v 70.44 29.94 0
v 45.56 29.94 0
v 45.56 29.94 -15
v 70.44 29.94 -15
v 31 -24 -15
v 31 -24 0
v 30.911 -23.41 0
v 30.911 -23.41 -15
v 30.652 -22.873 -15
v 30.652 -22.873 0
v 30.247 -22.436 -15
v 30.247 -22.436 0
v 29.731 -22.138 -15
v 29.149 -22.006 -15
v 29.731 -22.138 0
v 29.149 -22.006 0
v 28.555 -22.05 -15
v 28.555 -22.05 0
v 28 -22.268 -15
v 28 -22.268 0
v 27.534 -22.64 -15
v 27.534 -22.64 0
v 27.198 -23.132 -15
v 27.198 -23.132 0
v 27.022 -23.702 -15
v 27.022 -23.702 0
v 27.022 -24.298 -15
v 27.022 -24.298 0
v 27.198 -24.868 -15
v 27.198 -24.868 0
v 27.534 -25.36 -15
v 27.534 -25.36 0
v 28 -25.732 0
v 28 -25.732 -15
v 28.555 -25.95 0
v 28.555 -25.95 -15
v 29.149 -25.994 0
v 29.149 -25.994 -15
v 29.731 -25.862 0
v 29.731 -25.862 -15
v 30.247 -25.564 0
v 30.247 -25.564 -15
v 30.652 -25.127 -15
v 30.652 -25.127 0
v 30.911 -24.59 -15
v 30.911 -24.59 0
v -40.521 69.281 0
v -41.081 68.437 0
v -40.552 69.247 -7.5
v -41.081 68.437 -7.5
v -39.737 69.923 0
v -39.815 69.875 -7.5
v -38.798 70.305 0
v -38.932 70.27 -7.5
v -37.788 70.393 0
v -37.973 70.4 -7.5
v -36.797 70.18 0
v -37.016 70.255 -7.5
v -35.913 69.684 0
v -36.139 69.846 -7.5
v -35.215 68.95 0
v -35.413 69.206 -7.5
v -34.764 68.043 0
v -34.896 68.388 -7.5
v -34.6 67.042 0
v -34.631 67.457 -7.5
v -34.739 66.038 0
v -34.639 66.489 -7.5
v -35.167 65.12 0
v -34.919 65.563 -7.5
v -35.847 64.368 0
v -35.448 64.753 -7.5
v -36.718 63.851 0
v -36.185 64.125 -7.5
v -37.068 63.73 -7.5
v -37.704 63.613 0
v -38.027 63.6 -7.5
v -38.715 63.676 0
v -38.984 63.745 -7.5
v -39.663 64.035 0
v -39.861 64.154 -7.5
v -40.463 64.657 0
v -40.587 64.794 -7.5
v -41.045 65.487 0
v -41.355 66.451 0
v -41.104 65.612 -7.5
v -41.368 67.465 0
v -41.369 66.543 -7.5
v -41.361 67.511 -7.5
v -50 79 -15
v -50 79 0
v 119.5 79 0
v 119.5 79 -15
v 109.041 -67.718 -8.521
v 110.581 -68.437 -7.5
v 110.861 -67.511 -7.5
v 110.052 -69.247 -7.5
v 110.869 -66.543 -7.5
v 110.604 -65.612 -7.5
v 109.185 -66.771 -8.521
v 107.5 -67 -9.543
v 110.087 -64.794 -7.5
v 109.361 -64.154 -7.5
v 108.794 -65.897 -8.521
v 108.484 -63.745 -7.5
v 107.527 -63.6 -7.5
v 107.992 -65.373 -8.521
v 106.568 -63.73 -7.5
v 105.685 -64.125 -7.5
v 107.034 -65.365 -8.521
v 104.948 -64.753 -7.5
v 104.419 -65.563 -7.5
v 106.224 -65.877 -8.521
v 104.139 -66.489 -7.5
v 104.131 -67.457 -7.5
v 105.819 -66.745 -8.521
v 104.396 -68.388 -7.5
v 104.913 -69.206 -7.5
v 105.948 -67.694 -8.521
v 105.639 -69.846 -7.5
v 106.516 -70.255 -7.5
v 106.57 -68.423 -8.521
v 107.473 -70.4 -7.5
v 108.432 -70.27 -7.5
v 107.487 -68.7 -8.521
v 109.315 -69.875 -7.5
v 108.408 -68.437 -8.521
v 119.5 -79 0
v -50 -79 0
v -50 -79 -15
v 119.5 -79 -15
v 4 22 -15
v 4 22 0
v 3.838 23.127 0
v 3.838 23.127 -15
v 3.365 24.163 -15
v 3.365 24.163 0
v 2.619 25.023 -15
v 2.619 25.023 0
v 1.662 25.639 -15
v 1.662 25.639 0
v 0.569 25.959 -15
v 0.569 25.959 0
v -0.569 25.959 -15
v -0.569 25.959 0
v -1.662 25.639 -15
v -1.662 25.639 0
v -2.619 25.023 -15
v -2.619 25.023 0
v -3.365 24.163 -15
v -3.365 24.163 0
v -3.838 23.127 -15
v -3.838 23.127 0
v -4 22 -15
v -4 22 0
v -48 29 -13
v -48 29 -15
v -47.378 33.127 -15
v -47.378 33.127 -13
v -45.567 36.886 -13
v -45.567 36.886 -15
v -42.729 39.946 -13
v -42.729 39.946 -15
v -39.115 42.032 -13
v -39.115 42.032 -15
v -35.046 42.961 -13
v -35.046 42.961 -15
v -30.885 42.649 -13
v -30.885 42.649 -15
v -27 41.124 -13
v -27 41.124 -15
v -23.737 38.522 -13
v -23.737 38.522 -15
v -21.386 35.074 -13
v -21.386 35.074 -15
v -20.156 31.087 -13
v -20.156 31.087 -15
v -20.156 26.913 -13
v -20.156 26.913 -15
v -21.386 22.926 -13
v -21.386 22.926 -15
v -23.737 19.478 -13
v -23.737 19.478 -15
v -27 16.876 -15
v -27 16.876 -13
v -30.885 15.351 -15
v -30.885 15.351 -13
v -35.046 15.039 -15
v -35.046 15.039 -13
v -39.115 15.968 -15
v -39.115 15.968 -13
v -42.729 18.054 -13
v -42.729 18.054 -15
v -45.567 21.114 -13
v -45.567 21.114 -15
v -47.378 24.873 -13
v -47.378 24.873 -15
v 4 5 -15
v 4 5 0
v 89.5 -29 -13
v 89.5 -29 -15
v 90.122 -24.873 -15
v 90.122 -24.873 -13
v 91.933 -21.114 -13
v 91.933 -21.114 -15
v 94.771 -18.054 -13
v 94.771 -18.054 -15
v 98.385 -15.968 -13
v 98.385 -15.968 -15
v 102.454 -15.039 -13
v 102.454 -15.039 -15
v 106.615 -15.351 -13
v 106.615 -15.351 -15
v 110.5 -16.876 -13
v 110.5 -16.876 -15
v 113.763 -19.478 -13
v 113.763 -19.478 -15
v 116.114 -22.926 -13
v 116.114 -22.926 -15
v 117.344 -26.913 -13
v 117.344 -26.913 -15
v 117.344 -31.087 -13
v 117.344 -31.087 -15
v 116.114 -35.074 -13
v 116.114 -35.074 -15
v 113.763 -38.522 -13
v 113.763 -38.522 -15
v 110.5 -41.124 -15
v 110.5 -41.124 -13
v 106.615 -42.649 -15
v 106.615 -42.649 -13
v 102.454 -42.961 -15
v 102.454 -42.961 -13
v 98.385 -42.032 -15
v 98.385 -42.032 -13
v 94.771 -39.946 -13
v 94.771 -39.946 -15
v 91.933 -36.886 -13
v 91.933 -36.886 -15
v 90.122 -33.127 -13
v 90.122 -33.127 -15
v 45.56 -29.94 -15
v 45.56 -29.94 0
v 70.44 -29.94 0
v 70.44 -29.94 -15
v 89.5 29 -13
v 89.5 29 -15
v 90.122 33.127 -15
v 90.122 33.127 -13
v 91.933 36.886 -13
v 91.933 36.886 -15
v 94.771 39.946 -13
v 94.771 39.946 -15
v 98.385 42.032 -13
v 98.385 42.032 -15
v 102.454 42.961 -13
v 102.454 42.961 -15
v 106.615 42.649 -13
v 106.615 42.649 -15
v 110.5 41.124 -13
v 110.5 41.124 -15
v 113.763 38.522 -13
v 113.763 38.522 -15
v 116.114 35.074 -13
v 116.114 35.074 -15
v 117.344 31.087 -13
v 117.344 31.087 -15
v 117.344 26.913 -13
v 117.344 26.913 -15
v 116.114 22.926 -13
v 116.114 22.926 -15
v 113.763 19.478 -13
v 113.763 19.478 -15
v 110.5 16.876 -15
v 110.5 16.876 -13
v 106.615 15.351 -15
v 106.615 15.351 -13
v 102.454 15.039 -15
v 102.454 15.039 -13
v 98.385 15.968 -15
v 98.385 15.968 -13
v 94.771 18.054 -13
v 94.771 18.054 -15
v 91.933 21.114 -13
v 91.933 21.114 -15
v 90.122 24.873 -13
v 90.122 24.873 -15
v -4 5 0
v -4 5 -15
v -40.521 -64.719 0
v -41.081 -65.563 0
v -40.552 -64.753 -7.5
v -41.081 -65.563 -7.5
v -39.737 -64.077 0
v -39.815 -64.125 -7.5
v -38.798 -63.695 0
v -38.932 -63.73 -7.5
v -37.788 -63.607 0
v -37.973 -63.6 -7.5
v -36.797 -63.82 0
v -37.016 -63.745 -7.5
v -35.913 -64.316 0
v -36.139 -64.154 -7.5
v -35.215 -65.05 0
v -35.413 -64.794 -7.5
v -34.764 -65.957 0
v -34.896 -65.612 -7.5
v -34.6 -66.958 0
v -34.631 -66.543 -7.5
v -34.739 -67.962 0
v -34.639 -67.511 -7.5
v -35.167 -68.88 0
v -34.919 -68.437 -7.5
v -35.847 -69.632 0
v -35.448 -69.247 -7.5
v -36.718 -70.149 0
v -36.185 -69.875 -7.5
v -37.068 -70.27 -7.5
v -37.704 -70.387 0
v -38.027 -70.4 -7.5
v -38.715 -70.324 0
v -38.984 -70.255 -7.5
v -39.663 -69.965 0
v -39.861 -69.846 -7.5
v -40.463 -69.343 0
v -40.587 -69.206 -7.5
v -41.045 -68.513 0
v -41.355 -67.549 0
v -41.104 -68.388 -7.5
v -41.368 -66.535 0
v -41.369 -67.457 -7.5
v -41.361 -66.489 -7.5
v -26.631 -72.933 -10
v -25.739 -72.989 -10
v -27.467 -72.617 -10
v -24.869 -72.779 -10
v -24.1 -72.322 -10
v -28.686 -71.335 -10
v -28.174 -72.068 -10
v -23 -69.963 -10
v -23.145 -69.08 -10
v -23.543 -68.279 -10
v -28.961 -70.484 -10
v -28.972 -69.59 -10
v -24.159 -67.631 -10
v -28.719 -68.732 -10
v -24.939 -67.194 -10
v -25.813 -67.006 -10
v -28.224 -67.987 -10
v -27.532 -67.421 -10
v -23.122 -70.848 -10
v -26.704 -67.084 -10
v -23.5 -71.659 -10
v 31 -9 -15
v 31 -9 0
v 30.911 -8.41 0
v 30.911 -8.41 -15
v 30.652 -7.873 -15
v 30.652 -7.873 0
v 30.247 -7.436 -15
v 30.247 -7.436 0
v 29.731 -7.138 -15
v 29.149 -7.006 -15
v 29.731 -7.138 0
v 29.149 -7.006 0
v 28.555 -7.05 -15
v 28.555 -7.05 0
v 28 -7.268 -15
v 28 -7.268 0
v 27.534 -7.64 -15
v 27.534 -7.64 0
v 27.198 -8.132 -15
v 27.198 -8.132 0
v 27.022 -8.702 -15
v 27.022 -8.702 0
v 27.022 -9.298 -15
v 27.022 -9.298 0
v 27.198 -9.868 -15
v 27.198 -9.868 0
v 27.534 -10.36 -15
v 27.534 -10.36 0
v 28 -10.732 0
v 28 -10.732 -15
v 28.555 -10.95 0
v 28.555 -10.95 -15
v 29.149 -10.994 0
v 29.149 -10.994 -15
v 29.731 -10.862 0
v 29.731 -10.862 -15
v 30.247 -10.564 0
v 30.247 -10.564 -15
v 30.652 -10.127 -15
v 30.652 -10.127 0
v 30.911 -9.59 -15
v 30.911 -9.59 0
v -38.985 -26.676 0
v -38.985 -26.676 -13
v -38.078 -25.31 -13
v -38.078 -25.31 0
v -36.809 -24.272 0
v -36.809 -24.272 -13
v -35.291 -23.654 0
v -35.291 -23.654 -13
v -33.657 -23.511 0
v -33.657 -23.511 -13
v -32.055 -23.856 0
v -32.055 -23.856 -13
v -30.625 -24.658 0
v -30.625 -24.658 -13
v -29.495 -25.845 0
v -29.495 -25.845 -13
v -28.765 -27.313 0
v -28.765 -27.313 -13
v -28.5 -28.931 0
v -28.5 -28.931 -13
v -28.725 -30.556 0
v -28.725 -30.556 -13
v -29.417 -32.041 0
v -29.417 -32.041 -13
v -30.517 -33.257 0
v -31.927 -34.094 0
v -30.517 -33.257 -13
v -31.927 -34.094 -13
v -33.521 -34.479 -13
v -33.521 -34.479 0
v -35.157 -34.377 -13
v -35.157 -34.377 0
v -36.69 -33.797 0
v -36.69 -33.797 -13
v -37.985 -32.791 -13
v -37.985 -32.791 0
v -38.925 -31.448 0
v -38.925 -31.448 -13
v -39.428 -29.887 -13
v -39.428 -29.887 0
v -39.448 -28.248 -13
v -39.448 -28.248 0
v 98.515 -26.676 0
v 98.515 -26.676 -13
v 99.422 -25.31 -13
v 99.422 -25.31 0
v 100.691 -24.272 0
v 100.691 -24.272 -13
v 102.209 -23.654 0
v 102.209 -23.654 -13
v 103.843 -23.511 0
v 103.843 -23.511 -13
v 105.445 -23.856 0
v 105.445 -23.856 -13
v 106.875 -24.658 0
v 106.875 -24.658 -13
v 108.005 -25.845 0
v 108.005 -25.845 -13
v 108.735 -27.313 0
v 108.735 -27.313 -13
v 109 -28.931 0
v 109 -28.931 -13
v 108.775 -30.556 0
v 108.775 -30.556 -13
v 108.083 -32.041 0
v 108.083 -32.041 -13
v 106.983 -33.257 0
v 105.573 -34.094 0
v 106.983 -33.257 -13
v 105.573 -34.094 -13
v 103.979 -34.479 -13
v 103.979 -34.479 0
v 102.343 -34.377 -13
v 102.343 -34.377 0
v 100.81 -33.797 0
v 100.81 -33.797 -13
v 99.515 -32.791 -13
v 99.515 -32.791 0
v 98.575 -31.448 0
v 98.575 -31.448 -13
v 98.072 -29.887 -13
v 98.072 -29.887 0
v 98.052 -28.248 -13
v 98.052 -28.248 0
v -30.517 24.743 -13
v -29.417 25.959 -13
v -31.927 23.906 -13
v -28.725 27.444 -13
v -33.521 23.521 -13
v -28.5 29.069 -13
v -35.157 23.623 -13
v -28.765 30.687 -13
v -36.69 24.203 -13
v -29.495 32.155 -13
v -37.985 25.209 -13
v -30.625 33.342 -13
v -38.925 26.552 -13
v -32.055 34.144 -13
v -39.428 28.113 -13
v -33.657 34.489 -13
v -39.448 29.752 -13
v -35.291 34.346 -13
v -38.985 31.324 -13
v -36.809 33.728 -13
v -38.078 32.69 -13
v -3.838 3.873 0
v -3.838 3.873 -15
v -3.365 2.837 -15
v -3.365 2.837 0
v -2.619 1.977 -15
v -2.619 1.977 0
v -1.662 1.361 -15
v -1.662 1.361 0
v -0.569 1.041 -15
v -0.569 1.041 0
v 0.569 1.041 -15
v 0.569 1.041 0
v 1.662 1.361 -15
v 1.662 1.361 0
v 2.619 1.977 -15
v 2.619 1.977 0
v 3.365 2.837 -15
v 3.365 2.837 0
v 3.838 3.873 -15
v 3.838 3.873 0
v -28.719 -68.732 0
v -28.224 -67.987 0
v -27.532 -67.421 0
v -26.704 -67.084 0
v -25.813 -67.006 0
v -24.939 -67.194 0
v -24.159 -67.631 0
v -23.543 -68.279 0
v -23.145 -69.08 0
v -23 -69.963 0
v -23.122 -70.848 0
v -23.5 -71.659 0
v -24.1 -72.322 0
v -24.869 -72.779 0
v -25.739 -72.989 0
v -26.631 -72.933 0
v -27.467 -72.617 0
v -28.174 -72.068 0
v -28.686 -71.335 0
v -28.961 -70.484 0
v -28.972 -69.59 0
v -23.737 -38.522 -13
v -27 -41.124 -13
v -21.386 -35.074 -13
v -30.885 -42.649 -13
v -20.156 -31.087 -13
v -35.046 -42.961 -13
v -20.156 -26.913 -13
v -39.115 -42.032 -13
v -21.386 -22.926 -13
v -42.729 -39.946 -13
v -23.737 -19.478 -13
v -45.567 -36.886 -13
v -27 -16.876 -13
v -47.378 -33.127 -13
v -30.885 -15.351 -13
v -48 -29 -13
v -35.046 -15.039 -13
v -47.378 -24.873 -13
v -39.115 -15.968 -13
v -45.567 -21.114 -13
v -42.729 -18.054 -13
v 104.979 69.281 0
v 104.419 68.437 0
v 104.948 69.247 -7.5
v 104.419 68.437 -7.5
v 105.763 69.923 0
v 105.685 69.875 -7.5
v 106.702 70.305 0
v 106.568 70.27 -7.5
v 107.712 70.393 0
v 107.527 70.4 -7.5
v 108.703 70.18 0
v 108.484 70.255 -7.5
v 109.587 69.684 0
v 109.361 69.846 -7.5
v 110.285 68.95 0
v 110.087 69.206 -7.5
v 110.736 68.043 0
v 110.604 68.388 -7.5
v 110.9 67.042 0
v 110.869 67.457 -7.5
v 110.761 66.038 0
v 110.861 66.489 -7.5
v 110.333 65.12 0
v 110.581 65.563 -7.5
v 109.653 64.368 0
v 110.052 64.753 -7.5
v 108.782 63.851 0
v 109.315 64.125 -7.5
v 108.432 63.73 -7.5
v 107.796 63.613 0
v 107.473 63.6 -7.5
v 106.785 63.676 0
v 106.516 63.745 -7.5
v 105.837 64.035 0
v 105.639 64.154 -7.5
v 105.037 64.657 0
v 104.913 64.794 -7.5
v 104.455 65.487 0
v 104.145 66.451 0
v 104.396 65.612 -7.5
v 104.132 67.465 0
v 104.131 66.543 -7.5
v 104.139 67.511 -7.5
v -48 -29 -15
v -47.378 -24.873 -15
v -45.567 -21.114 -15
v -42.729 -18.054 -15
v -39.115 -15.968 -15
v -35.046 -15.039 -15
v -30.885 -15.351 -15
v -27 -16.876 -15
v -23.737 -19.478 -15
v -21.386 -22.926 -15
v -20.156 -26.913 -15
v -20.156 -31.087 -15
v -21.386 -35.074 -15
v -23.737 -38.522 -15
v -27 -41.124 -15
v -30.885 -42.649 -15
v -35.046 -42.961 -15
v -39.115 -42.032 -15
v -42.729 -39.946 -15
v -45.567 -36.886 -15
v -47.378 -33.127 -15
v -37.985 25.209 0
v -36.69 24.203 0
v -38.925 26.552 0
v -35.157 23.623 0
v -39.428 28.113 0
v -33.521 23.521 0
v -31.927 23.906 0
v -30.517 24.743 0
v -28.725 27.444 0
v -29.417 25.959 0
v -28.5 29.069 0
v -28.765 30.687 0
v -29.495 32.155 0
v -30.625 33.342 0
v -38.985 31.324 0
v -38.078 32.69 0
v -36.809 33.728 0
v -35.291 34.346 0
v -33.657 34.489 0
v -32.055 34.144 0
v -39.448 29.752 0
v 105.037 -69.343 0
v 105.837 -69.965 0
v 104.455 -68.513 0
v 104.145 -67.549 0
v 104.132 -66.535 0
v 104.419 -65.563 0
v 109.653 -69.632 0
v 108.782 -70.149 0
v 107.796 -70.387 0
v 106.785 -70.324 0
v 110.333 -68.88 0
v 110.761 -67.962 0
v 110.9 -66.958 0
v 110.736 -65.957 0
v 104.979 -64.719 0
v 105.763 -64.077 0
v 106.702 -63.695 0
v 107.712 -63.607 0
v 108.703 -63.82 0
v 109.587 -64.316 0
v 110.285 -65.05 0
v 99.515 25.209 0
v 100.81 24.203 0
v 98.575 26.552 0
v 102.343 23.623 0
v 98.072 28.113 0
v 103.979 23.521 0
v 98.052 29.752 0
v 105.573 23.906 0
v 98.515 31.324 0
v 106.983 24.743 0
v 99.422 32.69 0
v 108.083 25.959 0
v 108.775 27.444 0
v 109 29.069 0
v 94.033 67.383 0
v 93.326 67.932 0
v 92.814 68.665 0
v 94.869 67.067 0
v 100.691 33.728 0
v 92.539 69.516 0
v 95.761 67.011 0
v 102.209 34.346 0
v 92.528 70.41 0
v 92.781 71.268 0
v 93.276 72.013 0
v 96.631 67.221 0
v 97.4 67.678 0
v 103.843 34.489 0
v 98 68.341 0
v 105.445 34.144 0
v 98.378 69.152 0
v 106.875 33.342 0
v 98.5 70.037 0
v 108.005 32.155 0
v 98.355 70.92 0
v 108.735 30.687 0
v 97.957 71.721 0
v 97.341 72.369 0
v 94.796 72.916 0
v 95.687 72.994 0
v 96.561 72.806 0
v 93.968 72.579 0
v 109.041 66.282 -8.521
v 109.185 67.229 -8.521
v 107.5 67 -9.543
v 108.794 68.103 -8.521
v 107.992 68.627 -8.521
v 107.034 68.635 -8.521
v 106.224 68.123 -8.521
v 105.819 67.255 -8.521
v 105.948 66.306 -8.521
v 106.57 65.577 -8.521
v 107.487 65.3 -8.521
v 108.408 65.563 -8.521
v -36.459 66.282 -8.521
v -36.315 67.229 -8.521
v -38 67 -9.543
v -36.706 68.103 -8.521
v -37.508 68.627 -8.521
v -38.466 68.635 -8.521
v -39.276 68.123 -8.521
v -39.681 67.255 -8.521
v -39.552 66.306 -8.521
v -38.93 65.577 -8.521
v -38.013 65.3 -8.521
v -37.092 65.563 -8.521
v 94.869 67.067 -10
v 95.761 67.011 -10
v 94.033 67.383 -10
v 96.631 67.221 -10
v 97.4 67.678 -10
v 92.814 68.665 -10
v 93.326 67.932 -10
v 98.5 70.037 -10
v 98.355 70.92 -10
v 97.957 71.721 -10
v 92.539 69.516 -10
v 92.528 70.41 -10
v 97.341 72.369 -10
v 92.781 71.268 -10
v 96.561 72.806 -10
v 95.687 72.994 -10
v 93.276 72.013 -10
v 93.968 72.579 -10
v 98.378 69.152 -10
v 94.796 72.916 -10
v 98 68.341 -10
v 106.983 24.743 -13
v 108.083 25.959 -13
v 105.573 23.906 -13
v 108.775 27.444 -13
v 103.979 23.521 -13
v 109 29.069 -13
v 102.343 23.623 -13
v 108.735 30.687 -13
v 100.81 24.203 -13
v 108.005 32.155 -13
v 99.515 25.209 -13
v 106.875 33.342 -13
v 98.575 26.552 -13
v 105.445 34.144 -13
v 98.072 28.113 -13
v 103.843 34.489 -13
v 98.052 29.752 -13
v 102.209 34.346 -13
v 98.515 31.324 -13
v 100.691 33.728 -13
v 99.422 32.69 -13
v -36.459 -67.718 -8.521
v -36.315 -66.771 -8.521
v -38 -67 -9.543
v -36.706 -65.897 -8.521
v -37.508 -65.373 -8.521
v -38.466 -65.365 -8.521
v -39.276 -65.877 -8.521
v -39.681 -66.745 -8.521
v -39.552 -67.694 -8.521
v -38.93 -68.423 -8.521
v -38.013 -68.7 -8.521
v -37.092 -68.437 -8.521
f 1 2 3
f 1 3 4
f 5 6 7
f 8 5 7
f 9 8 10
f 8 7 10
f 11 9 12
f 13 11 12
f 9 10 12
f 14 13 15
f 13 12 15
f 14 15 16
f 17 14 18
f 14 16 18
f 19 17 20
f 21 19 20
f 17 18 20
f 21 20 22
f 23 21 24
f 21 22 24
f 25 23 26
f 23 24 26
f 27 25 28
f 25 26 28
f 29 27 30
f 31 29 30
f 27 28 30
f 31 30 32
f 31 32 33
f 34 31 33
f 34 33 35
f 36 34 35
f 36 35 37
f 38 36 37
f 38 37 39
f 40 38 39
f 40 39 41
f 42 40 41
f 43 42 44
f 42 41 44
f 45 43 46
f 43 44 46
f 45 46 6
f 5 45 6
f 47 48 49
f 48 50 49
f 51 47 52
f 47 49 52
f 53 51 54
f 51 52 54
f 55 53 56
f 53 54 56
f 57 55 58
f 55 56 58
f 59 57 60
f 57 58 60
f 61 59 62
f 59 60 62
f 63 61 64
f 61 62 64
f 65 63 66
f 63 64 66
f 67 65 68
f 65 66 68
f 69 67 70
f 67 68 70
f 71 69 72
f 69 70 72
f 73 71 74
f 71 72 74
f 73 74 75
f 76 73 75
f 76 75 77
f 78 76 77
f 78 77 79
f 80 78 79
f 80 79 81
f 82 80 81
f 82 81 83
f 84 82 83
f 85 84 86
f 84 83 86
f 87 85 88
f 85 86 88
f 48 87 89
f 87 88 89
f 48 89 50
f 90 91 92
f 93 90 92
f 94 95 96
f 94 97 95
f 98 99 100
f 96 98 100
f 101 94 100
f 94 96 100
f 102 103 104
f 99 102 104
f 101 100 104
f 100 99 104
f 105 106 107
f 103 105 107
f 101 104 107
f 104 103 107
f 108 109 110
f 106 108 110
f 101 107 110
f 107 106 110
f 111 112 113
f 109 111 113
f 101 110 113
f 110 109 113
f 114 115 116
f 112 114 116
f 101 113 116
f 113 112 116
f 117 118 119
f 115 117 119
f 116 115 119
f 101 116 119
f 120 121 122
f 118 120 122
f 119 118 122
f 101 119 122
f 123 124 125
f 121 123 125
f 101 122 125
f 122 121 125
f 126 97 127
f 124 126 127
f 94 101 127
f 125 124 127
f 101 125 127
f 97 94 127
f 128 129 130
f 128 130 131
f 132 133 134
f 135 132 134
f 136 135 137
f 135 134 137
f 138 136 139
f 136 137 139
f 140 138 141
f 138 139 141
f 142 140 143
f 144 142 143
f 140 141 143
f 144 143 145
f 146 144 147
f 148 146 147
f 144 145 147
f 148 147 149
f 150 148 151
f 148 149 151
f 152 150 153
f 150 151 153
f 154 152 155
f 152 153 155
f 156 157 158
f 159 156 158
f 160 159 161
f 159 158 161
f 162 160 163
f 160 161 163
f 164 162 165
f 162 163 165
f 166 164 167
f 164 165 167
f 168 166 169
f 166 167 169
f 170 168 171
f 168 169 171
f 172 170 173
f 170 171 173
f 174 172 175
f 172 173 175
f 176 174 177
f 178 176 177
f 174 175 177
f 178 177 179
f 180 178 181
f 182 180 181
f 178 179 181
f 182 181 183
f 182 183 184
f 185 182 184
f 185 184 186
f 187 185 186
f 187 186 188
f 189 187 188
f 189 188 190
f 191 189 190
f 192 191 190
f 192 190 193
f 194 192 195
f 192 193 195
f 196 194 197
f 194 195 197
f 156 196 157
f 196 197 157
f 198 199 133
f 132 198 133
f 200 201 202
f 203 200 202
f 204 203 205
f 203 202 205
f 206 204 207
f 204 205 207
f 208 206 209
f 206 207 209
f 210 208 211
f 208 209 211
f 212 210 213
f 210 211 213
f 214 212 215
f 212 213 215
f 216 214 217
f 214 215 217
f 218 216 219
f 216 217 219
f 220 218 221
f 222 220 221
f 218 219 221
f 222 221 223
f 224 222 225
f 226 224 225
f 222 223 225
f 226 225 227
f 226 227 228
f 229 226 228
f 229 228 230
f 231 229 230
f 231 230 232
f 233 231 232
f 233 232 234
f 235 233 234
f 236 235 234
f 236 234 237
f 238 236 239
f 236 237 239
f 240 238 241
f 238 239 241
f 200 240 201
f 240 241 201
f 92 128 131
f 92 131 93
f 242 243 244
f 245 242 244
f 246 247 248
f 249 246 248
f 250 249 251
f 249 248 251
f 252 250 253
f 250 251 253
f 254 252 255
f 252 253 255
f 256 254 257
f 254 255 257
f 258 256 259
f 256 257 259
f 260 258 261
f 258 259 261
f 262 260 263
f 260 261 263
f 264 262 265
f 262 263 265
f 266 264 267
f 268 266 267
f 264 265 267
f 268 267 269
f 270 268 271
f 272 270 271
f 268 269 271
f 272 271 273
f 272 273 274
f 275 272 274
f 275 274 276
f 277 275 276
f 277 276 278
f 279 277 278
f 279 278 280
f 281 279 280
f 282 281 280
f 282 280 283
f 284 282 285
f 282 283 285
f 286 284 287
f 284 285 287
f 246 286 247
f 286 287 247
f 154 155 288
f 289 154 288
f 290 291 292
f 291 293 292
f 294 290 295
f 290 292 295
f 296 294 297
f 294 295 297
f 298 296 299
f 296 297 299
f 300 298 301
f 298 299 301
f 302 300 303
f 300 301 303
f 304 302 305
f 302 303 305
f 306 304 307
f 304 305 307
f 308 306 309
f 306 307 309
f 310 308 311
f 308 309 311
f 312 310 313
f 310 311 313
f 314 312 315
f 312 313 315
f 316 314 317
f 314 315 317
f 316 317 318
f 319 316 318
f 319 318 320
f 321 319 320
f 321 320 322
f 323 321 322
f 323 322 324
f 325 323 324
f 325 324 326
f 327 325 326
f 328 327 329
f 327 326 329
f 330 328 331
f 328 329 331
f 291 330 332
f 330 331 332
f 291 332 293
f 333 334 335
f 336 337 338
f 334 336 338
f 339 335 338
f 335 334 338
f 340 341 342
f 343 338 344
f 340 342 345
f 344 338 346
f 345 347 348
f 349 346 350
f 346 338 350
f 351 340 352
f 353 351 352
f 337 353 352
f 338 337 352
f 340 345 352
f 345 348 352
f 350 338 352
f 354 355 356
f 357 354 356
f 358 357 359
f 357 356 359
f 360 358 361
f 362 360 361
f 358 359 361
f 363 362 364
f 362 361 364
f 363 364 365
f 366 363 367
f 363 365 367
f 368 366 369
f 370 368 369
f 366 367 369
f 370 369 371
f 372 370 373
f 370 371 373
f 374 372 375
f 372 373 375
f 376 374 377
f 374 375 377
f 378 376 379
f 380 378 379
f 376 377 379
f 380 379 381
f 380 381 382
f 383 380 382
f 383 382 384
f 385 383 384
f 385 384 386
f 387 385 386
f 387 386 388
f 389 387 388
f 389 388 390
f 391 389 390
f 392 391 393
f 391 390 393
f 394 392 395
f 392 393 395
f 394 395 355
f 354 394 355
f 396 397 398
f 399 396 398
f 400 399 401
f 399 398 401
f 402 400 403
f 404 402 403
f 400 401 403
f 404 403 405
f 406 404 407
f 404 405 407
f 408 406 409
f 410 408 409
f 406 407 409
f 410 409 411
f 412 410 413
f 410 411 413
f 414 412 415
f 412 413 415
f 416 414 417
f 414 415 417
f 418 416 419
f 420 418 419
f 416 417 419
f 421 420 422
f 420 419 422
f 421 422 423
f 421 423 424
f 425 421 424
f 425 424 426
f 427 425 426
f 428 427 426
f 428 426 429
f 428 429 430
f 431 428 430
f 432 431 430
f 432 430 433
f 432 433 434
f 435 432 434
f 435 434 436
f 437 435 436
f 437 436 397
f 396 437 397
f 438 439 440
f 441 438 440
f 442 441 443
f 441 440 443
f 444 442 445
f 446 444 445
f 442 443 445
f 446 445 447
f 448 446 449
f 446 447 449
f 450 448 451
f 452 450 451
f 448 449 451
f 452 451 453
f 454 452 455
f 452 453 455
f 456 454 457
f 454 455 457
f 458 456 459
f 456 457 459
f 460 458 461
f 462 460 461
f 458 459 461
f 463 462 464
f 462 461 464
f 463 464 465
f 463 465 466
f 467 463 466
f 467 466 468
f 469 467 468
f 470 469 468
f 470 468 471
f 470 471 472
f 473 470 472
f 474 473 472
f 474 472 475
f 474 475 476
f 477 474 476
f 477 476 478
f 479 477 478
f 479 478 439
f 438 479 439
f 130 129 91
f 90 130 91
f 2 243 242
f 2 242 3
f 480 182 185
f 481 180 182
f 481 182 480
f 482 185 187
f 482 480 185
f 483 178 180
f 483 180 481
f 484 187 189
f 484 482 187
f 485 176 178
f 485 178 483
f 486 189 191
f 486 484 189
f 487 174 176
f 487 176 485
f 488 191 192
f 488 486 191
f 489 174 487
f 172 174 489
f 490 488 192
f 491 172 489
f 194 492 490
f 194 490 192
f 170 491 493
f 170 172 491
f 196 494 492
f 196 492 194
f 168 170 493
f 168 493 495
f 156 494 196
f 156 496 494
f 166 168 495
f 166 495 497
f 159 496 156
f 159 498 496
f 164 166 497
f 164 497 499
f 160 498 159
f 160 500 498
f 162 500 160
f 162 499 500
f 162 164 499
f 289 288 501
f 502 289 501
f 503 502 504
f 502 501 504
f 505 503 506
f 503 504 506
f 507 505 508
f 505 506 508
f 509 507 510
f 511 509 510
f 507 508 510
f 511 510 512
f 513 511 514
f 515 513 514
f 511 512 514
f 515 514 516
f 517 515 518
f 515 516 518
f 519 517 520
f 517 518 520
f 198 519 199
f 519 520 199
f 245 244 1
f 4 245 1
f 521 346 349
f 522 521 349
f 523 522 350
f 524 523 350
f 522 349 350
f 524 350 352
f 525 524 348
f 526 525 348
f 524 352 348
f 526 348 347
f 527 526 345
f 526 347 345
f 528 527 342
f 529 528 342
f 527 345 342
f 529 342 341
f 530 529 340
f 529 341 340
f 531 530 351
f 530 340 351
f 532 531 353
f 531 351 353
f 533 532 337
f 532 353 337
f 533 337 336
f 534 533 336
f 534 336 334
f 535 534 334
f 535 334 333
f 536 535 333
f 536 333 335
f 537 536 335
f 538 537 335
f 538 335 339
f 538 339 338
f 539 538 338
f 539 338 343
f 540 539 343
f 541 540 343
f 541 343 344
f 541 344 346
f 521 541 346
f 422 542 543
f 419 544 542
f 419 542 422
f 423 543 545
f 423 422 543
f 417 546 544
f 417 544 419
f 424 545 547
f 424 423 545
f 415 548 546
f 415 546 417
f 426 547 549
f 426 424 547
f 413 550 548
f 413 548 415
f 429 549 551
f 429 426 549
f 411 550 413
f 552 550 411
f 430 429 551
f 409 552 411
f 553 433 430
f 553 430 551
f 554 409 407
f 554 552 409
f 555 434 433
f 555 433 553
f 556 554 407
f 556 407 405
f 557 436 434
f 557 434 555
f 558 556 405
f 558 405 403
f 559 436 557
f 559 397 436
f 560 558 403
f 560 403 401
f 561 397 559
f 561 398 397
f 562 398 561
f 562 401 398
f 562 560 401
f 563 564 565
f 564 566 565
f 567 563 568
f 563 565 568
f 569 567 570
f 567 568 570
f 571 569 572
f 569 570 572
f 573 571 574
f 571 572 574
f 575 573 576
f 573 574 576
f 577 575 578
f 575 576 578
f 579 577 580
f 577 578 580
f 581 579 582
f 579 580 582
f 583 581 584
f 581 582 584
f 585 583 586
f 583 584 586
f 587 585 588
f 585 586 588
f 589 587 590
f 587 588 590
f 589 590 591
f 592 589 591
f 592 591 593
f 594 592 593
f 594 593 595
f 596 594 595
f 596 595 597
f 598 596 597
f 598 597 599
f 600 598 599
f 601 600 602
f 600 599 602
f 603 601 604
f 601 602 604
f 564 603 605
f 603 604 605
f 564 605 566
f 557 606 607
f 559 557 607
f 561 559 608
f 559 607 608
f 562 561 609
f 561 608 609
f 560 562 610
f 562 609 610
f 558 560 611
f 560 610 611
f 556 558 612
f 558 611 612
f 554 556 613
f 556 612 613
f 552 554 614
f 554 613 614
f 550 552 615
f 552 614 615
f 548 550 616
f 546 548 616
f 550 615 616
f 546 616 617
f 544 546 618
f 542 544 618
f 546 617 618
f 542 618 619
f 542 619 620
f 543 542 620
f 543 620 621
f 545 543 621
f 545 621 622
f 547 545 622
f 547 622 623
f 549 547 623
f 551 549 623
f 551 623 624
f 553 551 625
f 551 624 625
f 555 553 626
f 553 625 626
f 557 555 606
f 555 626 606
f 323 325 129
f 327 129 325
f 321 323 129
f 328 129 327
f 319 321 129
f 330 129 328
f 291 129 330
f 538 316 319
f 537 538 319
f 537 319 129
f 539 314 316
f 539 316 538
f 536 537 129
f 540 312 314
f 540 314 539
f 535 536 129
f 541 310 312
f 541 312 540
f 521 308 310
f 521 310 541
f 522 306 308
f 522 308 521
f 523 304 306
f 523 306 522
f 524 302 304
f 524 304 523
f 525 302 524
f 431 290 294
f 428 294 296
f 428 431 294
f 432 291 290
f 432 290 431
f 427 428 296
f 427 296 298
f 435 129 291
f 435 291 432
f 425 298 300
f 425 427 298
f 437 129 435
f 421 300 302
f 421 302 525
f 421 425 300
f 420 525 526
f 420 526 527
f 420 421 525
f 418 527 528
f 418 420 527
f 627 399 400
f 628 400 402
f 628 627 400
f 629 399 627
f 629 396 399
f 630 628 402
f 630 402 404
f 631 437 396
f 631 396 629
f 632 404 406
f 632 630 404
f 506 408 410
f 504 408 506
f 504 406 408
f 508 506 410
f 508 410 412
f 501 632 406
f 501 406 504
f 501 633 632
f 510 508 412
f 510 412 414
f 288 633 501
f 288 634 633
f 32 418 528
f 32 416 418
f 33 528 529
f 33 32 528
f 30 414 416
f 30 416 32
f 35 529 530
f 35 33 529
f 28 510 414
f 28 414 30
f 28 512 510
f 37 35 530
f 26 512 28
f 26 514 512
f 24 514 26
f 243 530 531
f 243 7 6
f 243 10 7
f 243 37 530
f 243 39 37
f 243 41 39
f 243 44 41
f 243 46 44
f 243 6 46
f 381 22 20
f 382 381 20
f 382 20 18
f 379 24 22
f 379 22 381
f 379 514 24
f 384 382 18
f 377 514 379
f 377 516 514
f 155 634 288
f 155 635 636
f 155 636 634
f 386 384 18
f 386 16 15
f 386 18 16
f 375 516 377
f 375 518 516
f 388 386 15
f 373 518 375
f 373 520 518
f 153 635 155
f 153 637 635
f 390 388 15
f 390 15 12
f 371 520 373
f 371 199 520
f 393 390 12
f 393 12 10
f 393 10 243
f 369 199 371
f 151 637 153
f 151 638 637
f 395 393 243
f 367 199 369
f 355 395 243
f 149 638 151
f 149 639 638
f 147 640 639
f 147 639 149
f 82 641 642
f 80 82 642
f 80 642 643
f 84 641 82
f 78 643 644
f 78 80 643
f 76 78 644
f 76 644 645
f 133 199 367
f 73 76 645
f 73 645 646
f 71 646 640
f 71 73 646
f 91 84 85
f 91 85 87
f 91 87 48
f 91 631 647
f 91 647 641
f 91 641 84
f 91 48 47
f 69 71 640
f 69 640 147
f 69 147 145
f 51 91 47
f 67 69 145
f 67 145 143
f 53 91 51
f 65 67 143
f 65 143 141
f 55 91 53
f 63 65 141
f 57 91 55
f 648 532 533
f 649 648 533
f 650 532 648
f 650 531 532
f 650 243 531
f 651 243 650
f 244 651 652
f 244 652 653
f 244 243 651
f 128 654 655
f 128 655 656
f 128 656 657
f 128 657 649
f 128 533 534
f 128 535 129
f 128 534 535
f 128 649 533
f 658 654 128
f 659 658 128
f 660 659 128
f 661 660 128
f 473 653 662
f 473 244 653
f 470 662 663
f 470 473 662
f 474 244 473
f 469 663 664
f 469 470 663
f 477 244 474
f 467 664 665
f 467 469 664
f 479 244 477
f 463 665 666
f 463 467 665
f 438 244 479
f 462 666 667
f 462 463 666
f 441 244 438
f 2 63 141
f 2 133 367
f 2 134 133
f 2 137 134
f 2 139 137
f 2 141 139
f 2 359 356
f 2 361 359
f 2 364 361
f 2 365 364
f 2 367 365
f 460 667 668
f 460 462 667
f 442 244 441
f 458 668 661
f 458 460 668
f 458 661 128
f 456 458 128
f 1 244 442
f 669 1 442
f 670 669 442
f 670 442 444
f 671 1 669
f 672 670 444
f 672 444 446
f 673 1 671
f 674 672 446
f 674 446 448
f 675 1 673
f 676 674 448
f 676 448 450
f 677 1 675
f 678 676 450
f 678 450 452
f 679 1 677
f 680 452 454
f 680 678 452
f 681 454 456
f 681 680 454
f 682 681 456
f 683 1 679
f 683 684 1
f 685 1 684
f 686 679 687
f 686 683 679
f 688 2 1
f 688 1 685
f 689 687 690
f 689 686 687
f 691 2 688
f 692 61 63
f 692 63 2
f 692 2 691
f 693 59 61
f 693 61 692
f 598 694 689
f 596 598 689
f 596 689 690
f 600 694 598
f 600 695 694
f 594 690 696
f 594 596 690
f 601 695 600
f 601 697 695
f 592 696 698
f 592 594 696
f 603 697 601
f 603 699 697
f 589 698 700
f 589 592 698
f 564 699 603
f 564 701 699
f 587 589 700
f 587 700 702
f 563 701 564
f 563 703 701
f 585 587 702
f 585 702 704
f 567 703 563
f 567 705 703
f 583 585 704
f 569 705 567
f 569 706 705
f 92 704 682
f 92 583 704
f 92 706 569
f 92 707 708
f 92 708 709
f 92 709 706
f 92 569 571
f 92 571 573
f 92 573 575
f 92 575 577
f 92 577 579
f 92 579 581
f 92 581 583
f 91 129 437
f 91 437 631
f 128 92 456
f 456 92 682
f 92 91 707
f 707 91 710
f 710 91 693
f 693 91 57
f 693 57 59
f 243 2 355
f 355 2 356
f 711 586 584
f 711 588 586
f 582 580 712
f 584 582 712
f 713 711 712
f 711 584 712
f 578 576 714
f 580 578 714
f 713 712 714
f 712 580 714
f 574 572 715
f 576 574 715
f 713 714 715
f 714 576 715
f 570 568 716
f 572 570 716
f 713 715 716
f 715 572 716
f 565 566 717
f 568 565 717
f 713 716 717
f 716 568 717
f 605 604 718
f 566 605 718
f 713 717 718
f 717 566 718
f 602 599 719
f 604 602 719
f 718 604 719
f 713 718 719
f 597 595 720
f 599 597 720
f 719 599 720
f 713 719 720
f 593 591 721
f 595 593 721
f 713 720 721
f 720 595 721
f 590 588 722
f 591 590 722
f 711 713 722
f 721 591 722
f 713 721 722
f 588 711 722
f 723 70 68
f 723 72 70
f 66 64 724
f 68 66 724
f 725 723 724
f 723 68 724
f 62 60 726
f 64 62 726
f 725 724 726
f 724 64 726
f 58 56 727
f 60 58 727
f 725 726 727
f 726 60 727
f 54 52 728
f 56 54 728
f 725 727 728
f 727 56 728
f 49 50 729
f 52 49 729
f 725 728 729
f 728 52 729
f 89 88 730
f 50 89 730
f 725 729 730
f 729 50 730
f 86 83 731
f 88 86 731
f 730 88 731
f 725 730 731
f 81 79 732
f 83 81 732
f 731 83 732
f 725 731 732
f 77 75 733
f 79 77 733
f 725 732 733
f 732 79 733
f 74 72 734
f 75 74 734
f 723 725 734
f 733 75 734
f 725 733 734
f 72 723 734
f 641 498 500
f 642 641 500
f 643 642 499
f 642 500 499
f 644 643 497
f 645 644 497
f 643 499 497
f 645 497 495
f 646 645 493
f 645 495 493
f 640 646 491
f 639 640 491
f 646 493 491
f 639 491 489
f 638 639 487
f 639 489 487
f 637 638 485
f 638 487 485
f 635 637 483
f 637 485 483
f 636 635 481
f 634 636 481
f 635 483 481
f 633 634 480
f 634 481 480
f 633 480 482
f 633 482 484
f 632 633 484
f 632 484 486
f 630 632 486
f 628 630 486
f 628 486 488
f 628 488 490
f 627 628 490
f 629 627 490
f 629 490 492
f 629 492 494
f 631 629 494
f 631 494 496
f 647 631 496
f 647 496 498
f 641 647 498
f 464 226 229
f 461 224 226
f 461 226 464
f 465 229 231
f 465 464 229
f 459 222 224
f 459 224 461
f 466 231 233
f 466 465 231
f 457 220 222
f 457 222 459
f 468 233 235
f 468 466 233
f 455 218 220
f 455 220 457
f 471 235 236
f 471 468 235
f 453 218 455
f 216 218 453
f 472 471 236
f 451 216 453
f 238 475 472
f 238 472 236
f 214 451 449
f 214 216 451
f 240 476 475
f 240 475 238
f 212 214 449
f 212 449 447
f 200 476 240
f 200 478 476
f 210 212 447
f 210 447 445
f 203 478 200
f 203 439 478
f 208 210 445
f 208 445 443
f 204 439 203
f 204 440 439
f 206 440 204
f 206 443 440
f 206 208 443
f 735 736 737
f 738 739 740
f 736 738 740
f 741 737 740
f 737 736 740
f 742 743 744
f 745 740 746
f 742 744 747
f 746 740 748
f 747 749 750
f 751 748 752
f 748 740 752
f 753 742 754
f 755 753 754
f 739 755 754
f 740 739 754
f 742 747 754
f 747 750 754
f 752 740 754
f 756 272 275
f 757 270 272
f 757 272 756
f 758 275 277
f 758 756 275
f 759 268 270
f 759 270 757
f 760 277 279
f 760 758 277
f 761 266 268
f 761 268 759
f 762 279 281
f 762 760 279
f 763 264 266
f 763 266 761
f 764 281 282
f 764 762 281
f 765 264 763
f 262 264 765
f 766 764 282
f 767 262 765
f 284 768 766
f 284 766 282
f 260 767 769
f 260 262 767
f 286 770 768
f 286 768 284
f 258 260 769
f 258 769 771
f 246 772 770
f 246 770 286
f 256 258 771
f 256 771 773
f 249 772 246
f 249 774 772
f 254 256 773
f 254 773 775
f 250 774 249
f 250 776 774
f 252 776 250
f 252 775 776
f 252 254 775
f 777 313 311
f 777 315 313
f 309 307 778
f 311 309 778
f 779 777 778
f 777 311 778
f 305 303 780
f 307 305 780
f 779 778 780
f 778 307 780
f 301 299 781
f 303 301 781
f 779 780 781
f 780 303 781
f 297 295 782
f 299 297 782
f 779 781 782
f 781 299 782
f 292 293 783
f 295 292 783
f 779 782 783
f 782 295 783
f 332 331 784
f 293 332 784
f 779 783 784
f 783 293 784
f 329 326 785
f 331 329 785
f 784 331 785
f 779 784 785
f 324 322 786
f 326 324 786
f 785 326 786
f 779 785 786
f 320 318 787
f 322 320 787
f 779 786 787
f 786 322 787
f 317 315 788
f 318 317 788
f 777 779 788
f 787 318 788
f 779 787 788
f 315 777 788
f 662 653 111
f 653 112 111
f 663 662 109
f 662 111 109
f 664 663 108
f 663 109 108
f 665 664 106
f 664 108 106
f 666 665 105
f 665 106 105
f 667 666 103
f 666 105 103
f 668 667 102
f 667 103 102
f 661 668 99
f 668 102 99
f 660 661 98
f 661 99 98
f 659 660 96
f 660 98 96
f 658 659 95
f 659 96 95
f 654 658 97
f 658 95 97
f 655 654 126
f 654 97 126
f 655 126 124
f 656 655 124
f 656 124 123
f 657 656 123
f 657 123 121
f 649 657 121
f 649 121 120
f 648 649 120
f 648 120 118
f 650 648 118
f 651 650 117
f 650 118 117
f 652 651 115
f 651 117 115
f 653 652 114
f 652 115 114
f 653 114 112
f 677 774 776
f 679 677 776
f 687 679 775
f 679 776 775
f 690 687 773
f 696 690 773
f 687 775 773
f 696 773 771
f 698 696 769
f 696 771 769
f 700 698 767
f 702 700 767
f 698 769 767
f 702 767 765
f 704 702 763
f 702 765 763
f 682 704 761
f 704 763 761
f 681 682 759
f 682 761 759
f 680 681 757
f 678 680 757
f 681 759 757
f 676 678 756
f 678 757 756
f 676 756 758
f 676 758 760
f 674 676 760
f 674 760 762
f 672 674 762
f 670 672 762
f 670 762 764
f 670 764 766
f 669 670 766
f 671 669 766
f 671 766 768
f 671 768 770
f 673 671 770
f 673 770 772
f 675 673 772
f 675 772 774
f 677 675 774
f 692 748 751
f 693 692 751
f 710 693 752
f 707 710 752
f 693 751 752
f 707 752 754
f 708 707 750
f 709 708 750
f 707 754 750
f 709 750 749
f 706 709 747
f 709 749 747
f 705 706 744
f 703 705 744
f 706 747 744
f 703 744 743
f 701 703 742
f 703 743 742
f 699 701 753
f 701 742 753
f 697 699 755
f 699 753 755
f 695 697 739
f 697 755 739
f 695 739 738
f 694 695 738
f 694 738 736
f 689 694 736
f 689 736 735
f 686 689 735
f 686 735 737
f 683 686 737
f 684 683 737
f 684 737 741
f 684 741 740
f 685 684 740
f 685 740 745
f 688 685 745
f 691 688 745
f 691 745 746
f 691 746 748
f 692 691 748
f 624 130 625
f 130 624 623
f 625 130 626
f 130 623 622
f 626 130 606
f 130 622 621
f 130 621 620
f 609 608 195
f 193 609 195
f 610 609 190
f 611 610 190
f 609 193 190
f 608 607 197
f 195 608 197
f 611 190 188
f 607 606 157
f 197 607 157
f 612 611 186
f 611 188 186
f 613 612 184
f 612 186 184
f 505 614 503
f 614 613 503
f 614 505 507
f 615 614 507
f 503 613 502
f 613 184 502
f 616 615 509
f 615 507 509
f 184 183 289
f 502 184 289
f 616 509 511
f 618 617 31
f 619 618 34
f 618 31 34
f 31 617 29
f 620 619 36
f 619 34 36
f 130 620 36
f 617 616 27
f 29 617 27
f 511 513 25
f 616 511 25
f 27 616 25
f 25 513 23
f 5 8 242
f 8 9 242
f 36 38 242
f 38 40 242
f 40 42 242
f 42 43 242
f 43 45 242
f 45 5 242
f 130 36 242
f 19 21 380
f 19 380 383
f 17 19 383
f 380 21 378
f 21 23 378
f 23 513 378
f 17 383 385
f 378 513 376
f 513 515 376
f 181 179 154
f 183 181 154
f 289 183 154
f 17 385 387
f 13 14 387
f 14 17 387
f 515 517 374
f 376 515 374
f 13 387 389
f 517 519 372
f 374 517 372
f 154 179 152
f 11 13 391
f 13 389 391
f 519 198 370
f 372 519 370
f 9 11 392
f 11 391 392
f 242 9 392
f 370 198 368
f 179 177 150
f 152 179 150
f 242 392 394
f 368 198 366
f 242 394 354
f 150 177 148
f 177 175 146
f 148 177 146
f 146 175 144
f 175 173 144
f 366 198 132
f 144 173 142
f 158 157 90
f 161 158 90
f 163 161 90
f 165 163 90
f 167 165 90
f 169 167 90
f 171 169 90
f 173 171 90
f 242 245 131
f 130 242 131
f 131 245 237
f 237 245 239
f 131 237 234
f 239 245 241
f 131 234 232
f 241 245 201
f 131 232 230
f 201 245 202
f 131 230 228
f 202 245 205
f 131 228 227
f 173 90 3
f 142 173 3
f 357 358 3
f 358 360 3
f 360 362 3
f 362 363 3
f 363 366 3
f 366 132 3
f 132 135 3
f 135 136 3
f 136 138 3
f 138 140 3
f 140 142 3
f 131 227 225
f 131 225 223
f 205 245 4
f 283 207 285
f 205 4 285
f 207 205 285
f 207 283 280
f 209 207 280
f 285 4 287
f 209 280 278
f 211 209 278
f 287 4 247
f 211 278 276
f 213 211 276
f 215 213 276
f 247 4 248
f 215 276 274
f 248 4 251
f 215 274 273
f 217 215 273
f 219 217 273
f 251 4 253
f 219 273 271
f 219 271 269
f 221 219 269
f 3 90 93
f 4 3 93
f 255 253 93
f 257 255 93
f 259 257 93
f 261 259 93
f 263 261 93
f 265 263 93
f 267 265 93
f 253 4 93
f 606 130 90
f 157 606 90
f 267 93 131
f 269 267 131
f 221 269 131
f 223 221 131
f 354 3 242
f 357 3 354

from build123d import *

# Parameters (mm, degrees)
SKETCH2_W                           = 169.5
SKETCH2_H                           = 158
SKETCH2_R                           = 2
SKETCH2_W_2                         = 24.88
SKETCH2_H_2                         = 59.88
BOSS_EXTRUDE1_DEPTH                 = 15
M8X1_25_TAPPED_HOLE1_D              = 6.8
M8X1_25_TAPPED_HOLE1_DEPTH          = 7.5
M8X1_25_TAPPED_HOLE1_TIP            = 2.042926105
F_6_0MM_CLEARANCE_DOWEL_HOLE1_D     = 6
F_6_0MM_CLEARANCE_DOWEL_HOLE1_DEPTH = 10
SKETCH7_R                           = 14
CUT_EXTRUDE1_DEPTH                  = 2
M10_CLEARANCE_HOLE1_D               = 11


with BuildPart() as part:
    # Sketch2 → Boss-Extrude1 (new body)
    with BuildSketch(Plane.XY):
        with Locations((34.75, 0)):
            Rectangle(SKETCH2_W, SKETCH2_H)
        with Locations((29, -9)):
            Circle(SKETCH2_R, mode=Mode.SUBTRACT)
        with Locations((29, -24)):
            Circle(SKETCH2_R, mode=Mode.SUBTRACT)
        with BuildLine():
            Line((-4, 22), (-4, 5))
            ThreePointArc((-4, 5), (0, 1), (4, 5))
            Line((4, 5), (4, 22))
            ThreePointArc((4, 22), (0, 26), (-4, 22))
        make_face(mode=Mode.SUBTRACT)
        with Locations((58, 0)):
            Rectangle(SKETCH2_W_2, SKETCH2_H_2, mode=Mode.SUBTRACT)
    extrude(amount=-BOSS_EXTRUDE1_DEPTH)

    # M8x1.25 Tapped Hole1
    with Locations(Plane(origin=(0, 0, 0), x_dir=(0.9063077870366375, -0.42261826174072625, 0), z_dir=(0, 0, 1))):
        with Locations((125.743510643, -15.291158594), (69.11266357, 106.154084869), (-62.755119444, 44.663127785), (-6.124272371, -76.782115678)):
            Hole(M8X1_25_TAPPED_HOLE1_D / 2, depth=M8X1_25_TAPPED_HOLE1_DEPTH)
            with Locations((0, 0, -(M8X1_25_TAPPED_HOLE1_DEPTH + M8X1_25_TAPPED_HOLE1_TIP / 2))):  # 118° drill point
                Cone(0, M8X1_25_TAPPED_HOLE1_D / 2, M8X1_25_TAPPED_HOLE1_TIP, mode=Mode.SUBTRACT)

    # Ø6.0mm Clearance Dowel Hole1
    with Locations(Plane(origin=(0, 0, 0), x_dir=(0.9063077870366375, -0.42261826174072625, 0), z_dir=(0, 0, 1))):
        with Locations((56.96911534, 103.801589089), (6.019275859, -74.429619898)):
            Hole(F_6_0MM_CLEARANCE_DOWEL_HOLE1_D / 2, depth=F_6_0MM_CLEARANCE_DOWEL_HOLE1_DEPTH)

    # Sketch7 → Cut-Extrude1 (cut)
    with BuildSketch(Plane(origin=(0, 0, -15), x_dir=(-1, 0, 0), z_dir=(0, 0, -1))):
        with Locations((-103.5, 29)):
            Circle(SKETCH7_R)
        with Locations((34, 29)):
            Circle(SKETCH7_R)
        with Locations((34, -29)):
            Circle(SKETCH7_R)
        with Locations((-103.5, -29)):
            Circle(SKETCH7_R)
    extrude(amount=-CUT_EXTRUDE1_DEPTH, mode=Mode.SUBTRACT)

    # M10 Clearance Hole1 (through all)
    with Locations(Plane(origin=(0, 0, 0), x_dir=(0.9063077870366375, -0.42261826174072625, 0), z_dir=(0, 0, 1))):
        with Locations((-43.07039435, 11.913904925), (-18.558535169, -40.651946723), (81.546926368, 70.023915914), (106.058785549, 17.458064266)):
            Hole(M10_CLEARANCE_HOLE1_D / 2)


solid = part.part
